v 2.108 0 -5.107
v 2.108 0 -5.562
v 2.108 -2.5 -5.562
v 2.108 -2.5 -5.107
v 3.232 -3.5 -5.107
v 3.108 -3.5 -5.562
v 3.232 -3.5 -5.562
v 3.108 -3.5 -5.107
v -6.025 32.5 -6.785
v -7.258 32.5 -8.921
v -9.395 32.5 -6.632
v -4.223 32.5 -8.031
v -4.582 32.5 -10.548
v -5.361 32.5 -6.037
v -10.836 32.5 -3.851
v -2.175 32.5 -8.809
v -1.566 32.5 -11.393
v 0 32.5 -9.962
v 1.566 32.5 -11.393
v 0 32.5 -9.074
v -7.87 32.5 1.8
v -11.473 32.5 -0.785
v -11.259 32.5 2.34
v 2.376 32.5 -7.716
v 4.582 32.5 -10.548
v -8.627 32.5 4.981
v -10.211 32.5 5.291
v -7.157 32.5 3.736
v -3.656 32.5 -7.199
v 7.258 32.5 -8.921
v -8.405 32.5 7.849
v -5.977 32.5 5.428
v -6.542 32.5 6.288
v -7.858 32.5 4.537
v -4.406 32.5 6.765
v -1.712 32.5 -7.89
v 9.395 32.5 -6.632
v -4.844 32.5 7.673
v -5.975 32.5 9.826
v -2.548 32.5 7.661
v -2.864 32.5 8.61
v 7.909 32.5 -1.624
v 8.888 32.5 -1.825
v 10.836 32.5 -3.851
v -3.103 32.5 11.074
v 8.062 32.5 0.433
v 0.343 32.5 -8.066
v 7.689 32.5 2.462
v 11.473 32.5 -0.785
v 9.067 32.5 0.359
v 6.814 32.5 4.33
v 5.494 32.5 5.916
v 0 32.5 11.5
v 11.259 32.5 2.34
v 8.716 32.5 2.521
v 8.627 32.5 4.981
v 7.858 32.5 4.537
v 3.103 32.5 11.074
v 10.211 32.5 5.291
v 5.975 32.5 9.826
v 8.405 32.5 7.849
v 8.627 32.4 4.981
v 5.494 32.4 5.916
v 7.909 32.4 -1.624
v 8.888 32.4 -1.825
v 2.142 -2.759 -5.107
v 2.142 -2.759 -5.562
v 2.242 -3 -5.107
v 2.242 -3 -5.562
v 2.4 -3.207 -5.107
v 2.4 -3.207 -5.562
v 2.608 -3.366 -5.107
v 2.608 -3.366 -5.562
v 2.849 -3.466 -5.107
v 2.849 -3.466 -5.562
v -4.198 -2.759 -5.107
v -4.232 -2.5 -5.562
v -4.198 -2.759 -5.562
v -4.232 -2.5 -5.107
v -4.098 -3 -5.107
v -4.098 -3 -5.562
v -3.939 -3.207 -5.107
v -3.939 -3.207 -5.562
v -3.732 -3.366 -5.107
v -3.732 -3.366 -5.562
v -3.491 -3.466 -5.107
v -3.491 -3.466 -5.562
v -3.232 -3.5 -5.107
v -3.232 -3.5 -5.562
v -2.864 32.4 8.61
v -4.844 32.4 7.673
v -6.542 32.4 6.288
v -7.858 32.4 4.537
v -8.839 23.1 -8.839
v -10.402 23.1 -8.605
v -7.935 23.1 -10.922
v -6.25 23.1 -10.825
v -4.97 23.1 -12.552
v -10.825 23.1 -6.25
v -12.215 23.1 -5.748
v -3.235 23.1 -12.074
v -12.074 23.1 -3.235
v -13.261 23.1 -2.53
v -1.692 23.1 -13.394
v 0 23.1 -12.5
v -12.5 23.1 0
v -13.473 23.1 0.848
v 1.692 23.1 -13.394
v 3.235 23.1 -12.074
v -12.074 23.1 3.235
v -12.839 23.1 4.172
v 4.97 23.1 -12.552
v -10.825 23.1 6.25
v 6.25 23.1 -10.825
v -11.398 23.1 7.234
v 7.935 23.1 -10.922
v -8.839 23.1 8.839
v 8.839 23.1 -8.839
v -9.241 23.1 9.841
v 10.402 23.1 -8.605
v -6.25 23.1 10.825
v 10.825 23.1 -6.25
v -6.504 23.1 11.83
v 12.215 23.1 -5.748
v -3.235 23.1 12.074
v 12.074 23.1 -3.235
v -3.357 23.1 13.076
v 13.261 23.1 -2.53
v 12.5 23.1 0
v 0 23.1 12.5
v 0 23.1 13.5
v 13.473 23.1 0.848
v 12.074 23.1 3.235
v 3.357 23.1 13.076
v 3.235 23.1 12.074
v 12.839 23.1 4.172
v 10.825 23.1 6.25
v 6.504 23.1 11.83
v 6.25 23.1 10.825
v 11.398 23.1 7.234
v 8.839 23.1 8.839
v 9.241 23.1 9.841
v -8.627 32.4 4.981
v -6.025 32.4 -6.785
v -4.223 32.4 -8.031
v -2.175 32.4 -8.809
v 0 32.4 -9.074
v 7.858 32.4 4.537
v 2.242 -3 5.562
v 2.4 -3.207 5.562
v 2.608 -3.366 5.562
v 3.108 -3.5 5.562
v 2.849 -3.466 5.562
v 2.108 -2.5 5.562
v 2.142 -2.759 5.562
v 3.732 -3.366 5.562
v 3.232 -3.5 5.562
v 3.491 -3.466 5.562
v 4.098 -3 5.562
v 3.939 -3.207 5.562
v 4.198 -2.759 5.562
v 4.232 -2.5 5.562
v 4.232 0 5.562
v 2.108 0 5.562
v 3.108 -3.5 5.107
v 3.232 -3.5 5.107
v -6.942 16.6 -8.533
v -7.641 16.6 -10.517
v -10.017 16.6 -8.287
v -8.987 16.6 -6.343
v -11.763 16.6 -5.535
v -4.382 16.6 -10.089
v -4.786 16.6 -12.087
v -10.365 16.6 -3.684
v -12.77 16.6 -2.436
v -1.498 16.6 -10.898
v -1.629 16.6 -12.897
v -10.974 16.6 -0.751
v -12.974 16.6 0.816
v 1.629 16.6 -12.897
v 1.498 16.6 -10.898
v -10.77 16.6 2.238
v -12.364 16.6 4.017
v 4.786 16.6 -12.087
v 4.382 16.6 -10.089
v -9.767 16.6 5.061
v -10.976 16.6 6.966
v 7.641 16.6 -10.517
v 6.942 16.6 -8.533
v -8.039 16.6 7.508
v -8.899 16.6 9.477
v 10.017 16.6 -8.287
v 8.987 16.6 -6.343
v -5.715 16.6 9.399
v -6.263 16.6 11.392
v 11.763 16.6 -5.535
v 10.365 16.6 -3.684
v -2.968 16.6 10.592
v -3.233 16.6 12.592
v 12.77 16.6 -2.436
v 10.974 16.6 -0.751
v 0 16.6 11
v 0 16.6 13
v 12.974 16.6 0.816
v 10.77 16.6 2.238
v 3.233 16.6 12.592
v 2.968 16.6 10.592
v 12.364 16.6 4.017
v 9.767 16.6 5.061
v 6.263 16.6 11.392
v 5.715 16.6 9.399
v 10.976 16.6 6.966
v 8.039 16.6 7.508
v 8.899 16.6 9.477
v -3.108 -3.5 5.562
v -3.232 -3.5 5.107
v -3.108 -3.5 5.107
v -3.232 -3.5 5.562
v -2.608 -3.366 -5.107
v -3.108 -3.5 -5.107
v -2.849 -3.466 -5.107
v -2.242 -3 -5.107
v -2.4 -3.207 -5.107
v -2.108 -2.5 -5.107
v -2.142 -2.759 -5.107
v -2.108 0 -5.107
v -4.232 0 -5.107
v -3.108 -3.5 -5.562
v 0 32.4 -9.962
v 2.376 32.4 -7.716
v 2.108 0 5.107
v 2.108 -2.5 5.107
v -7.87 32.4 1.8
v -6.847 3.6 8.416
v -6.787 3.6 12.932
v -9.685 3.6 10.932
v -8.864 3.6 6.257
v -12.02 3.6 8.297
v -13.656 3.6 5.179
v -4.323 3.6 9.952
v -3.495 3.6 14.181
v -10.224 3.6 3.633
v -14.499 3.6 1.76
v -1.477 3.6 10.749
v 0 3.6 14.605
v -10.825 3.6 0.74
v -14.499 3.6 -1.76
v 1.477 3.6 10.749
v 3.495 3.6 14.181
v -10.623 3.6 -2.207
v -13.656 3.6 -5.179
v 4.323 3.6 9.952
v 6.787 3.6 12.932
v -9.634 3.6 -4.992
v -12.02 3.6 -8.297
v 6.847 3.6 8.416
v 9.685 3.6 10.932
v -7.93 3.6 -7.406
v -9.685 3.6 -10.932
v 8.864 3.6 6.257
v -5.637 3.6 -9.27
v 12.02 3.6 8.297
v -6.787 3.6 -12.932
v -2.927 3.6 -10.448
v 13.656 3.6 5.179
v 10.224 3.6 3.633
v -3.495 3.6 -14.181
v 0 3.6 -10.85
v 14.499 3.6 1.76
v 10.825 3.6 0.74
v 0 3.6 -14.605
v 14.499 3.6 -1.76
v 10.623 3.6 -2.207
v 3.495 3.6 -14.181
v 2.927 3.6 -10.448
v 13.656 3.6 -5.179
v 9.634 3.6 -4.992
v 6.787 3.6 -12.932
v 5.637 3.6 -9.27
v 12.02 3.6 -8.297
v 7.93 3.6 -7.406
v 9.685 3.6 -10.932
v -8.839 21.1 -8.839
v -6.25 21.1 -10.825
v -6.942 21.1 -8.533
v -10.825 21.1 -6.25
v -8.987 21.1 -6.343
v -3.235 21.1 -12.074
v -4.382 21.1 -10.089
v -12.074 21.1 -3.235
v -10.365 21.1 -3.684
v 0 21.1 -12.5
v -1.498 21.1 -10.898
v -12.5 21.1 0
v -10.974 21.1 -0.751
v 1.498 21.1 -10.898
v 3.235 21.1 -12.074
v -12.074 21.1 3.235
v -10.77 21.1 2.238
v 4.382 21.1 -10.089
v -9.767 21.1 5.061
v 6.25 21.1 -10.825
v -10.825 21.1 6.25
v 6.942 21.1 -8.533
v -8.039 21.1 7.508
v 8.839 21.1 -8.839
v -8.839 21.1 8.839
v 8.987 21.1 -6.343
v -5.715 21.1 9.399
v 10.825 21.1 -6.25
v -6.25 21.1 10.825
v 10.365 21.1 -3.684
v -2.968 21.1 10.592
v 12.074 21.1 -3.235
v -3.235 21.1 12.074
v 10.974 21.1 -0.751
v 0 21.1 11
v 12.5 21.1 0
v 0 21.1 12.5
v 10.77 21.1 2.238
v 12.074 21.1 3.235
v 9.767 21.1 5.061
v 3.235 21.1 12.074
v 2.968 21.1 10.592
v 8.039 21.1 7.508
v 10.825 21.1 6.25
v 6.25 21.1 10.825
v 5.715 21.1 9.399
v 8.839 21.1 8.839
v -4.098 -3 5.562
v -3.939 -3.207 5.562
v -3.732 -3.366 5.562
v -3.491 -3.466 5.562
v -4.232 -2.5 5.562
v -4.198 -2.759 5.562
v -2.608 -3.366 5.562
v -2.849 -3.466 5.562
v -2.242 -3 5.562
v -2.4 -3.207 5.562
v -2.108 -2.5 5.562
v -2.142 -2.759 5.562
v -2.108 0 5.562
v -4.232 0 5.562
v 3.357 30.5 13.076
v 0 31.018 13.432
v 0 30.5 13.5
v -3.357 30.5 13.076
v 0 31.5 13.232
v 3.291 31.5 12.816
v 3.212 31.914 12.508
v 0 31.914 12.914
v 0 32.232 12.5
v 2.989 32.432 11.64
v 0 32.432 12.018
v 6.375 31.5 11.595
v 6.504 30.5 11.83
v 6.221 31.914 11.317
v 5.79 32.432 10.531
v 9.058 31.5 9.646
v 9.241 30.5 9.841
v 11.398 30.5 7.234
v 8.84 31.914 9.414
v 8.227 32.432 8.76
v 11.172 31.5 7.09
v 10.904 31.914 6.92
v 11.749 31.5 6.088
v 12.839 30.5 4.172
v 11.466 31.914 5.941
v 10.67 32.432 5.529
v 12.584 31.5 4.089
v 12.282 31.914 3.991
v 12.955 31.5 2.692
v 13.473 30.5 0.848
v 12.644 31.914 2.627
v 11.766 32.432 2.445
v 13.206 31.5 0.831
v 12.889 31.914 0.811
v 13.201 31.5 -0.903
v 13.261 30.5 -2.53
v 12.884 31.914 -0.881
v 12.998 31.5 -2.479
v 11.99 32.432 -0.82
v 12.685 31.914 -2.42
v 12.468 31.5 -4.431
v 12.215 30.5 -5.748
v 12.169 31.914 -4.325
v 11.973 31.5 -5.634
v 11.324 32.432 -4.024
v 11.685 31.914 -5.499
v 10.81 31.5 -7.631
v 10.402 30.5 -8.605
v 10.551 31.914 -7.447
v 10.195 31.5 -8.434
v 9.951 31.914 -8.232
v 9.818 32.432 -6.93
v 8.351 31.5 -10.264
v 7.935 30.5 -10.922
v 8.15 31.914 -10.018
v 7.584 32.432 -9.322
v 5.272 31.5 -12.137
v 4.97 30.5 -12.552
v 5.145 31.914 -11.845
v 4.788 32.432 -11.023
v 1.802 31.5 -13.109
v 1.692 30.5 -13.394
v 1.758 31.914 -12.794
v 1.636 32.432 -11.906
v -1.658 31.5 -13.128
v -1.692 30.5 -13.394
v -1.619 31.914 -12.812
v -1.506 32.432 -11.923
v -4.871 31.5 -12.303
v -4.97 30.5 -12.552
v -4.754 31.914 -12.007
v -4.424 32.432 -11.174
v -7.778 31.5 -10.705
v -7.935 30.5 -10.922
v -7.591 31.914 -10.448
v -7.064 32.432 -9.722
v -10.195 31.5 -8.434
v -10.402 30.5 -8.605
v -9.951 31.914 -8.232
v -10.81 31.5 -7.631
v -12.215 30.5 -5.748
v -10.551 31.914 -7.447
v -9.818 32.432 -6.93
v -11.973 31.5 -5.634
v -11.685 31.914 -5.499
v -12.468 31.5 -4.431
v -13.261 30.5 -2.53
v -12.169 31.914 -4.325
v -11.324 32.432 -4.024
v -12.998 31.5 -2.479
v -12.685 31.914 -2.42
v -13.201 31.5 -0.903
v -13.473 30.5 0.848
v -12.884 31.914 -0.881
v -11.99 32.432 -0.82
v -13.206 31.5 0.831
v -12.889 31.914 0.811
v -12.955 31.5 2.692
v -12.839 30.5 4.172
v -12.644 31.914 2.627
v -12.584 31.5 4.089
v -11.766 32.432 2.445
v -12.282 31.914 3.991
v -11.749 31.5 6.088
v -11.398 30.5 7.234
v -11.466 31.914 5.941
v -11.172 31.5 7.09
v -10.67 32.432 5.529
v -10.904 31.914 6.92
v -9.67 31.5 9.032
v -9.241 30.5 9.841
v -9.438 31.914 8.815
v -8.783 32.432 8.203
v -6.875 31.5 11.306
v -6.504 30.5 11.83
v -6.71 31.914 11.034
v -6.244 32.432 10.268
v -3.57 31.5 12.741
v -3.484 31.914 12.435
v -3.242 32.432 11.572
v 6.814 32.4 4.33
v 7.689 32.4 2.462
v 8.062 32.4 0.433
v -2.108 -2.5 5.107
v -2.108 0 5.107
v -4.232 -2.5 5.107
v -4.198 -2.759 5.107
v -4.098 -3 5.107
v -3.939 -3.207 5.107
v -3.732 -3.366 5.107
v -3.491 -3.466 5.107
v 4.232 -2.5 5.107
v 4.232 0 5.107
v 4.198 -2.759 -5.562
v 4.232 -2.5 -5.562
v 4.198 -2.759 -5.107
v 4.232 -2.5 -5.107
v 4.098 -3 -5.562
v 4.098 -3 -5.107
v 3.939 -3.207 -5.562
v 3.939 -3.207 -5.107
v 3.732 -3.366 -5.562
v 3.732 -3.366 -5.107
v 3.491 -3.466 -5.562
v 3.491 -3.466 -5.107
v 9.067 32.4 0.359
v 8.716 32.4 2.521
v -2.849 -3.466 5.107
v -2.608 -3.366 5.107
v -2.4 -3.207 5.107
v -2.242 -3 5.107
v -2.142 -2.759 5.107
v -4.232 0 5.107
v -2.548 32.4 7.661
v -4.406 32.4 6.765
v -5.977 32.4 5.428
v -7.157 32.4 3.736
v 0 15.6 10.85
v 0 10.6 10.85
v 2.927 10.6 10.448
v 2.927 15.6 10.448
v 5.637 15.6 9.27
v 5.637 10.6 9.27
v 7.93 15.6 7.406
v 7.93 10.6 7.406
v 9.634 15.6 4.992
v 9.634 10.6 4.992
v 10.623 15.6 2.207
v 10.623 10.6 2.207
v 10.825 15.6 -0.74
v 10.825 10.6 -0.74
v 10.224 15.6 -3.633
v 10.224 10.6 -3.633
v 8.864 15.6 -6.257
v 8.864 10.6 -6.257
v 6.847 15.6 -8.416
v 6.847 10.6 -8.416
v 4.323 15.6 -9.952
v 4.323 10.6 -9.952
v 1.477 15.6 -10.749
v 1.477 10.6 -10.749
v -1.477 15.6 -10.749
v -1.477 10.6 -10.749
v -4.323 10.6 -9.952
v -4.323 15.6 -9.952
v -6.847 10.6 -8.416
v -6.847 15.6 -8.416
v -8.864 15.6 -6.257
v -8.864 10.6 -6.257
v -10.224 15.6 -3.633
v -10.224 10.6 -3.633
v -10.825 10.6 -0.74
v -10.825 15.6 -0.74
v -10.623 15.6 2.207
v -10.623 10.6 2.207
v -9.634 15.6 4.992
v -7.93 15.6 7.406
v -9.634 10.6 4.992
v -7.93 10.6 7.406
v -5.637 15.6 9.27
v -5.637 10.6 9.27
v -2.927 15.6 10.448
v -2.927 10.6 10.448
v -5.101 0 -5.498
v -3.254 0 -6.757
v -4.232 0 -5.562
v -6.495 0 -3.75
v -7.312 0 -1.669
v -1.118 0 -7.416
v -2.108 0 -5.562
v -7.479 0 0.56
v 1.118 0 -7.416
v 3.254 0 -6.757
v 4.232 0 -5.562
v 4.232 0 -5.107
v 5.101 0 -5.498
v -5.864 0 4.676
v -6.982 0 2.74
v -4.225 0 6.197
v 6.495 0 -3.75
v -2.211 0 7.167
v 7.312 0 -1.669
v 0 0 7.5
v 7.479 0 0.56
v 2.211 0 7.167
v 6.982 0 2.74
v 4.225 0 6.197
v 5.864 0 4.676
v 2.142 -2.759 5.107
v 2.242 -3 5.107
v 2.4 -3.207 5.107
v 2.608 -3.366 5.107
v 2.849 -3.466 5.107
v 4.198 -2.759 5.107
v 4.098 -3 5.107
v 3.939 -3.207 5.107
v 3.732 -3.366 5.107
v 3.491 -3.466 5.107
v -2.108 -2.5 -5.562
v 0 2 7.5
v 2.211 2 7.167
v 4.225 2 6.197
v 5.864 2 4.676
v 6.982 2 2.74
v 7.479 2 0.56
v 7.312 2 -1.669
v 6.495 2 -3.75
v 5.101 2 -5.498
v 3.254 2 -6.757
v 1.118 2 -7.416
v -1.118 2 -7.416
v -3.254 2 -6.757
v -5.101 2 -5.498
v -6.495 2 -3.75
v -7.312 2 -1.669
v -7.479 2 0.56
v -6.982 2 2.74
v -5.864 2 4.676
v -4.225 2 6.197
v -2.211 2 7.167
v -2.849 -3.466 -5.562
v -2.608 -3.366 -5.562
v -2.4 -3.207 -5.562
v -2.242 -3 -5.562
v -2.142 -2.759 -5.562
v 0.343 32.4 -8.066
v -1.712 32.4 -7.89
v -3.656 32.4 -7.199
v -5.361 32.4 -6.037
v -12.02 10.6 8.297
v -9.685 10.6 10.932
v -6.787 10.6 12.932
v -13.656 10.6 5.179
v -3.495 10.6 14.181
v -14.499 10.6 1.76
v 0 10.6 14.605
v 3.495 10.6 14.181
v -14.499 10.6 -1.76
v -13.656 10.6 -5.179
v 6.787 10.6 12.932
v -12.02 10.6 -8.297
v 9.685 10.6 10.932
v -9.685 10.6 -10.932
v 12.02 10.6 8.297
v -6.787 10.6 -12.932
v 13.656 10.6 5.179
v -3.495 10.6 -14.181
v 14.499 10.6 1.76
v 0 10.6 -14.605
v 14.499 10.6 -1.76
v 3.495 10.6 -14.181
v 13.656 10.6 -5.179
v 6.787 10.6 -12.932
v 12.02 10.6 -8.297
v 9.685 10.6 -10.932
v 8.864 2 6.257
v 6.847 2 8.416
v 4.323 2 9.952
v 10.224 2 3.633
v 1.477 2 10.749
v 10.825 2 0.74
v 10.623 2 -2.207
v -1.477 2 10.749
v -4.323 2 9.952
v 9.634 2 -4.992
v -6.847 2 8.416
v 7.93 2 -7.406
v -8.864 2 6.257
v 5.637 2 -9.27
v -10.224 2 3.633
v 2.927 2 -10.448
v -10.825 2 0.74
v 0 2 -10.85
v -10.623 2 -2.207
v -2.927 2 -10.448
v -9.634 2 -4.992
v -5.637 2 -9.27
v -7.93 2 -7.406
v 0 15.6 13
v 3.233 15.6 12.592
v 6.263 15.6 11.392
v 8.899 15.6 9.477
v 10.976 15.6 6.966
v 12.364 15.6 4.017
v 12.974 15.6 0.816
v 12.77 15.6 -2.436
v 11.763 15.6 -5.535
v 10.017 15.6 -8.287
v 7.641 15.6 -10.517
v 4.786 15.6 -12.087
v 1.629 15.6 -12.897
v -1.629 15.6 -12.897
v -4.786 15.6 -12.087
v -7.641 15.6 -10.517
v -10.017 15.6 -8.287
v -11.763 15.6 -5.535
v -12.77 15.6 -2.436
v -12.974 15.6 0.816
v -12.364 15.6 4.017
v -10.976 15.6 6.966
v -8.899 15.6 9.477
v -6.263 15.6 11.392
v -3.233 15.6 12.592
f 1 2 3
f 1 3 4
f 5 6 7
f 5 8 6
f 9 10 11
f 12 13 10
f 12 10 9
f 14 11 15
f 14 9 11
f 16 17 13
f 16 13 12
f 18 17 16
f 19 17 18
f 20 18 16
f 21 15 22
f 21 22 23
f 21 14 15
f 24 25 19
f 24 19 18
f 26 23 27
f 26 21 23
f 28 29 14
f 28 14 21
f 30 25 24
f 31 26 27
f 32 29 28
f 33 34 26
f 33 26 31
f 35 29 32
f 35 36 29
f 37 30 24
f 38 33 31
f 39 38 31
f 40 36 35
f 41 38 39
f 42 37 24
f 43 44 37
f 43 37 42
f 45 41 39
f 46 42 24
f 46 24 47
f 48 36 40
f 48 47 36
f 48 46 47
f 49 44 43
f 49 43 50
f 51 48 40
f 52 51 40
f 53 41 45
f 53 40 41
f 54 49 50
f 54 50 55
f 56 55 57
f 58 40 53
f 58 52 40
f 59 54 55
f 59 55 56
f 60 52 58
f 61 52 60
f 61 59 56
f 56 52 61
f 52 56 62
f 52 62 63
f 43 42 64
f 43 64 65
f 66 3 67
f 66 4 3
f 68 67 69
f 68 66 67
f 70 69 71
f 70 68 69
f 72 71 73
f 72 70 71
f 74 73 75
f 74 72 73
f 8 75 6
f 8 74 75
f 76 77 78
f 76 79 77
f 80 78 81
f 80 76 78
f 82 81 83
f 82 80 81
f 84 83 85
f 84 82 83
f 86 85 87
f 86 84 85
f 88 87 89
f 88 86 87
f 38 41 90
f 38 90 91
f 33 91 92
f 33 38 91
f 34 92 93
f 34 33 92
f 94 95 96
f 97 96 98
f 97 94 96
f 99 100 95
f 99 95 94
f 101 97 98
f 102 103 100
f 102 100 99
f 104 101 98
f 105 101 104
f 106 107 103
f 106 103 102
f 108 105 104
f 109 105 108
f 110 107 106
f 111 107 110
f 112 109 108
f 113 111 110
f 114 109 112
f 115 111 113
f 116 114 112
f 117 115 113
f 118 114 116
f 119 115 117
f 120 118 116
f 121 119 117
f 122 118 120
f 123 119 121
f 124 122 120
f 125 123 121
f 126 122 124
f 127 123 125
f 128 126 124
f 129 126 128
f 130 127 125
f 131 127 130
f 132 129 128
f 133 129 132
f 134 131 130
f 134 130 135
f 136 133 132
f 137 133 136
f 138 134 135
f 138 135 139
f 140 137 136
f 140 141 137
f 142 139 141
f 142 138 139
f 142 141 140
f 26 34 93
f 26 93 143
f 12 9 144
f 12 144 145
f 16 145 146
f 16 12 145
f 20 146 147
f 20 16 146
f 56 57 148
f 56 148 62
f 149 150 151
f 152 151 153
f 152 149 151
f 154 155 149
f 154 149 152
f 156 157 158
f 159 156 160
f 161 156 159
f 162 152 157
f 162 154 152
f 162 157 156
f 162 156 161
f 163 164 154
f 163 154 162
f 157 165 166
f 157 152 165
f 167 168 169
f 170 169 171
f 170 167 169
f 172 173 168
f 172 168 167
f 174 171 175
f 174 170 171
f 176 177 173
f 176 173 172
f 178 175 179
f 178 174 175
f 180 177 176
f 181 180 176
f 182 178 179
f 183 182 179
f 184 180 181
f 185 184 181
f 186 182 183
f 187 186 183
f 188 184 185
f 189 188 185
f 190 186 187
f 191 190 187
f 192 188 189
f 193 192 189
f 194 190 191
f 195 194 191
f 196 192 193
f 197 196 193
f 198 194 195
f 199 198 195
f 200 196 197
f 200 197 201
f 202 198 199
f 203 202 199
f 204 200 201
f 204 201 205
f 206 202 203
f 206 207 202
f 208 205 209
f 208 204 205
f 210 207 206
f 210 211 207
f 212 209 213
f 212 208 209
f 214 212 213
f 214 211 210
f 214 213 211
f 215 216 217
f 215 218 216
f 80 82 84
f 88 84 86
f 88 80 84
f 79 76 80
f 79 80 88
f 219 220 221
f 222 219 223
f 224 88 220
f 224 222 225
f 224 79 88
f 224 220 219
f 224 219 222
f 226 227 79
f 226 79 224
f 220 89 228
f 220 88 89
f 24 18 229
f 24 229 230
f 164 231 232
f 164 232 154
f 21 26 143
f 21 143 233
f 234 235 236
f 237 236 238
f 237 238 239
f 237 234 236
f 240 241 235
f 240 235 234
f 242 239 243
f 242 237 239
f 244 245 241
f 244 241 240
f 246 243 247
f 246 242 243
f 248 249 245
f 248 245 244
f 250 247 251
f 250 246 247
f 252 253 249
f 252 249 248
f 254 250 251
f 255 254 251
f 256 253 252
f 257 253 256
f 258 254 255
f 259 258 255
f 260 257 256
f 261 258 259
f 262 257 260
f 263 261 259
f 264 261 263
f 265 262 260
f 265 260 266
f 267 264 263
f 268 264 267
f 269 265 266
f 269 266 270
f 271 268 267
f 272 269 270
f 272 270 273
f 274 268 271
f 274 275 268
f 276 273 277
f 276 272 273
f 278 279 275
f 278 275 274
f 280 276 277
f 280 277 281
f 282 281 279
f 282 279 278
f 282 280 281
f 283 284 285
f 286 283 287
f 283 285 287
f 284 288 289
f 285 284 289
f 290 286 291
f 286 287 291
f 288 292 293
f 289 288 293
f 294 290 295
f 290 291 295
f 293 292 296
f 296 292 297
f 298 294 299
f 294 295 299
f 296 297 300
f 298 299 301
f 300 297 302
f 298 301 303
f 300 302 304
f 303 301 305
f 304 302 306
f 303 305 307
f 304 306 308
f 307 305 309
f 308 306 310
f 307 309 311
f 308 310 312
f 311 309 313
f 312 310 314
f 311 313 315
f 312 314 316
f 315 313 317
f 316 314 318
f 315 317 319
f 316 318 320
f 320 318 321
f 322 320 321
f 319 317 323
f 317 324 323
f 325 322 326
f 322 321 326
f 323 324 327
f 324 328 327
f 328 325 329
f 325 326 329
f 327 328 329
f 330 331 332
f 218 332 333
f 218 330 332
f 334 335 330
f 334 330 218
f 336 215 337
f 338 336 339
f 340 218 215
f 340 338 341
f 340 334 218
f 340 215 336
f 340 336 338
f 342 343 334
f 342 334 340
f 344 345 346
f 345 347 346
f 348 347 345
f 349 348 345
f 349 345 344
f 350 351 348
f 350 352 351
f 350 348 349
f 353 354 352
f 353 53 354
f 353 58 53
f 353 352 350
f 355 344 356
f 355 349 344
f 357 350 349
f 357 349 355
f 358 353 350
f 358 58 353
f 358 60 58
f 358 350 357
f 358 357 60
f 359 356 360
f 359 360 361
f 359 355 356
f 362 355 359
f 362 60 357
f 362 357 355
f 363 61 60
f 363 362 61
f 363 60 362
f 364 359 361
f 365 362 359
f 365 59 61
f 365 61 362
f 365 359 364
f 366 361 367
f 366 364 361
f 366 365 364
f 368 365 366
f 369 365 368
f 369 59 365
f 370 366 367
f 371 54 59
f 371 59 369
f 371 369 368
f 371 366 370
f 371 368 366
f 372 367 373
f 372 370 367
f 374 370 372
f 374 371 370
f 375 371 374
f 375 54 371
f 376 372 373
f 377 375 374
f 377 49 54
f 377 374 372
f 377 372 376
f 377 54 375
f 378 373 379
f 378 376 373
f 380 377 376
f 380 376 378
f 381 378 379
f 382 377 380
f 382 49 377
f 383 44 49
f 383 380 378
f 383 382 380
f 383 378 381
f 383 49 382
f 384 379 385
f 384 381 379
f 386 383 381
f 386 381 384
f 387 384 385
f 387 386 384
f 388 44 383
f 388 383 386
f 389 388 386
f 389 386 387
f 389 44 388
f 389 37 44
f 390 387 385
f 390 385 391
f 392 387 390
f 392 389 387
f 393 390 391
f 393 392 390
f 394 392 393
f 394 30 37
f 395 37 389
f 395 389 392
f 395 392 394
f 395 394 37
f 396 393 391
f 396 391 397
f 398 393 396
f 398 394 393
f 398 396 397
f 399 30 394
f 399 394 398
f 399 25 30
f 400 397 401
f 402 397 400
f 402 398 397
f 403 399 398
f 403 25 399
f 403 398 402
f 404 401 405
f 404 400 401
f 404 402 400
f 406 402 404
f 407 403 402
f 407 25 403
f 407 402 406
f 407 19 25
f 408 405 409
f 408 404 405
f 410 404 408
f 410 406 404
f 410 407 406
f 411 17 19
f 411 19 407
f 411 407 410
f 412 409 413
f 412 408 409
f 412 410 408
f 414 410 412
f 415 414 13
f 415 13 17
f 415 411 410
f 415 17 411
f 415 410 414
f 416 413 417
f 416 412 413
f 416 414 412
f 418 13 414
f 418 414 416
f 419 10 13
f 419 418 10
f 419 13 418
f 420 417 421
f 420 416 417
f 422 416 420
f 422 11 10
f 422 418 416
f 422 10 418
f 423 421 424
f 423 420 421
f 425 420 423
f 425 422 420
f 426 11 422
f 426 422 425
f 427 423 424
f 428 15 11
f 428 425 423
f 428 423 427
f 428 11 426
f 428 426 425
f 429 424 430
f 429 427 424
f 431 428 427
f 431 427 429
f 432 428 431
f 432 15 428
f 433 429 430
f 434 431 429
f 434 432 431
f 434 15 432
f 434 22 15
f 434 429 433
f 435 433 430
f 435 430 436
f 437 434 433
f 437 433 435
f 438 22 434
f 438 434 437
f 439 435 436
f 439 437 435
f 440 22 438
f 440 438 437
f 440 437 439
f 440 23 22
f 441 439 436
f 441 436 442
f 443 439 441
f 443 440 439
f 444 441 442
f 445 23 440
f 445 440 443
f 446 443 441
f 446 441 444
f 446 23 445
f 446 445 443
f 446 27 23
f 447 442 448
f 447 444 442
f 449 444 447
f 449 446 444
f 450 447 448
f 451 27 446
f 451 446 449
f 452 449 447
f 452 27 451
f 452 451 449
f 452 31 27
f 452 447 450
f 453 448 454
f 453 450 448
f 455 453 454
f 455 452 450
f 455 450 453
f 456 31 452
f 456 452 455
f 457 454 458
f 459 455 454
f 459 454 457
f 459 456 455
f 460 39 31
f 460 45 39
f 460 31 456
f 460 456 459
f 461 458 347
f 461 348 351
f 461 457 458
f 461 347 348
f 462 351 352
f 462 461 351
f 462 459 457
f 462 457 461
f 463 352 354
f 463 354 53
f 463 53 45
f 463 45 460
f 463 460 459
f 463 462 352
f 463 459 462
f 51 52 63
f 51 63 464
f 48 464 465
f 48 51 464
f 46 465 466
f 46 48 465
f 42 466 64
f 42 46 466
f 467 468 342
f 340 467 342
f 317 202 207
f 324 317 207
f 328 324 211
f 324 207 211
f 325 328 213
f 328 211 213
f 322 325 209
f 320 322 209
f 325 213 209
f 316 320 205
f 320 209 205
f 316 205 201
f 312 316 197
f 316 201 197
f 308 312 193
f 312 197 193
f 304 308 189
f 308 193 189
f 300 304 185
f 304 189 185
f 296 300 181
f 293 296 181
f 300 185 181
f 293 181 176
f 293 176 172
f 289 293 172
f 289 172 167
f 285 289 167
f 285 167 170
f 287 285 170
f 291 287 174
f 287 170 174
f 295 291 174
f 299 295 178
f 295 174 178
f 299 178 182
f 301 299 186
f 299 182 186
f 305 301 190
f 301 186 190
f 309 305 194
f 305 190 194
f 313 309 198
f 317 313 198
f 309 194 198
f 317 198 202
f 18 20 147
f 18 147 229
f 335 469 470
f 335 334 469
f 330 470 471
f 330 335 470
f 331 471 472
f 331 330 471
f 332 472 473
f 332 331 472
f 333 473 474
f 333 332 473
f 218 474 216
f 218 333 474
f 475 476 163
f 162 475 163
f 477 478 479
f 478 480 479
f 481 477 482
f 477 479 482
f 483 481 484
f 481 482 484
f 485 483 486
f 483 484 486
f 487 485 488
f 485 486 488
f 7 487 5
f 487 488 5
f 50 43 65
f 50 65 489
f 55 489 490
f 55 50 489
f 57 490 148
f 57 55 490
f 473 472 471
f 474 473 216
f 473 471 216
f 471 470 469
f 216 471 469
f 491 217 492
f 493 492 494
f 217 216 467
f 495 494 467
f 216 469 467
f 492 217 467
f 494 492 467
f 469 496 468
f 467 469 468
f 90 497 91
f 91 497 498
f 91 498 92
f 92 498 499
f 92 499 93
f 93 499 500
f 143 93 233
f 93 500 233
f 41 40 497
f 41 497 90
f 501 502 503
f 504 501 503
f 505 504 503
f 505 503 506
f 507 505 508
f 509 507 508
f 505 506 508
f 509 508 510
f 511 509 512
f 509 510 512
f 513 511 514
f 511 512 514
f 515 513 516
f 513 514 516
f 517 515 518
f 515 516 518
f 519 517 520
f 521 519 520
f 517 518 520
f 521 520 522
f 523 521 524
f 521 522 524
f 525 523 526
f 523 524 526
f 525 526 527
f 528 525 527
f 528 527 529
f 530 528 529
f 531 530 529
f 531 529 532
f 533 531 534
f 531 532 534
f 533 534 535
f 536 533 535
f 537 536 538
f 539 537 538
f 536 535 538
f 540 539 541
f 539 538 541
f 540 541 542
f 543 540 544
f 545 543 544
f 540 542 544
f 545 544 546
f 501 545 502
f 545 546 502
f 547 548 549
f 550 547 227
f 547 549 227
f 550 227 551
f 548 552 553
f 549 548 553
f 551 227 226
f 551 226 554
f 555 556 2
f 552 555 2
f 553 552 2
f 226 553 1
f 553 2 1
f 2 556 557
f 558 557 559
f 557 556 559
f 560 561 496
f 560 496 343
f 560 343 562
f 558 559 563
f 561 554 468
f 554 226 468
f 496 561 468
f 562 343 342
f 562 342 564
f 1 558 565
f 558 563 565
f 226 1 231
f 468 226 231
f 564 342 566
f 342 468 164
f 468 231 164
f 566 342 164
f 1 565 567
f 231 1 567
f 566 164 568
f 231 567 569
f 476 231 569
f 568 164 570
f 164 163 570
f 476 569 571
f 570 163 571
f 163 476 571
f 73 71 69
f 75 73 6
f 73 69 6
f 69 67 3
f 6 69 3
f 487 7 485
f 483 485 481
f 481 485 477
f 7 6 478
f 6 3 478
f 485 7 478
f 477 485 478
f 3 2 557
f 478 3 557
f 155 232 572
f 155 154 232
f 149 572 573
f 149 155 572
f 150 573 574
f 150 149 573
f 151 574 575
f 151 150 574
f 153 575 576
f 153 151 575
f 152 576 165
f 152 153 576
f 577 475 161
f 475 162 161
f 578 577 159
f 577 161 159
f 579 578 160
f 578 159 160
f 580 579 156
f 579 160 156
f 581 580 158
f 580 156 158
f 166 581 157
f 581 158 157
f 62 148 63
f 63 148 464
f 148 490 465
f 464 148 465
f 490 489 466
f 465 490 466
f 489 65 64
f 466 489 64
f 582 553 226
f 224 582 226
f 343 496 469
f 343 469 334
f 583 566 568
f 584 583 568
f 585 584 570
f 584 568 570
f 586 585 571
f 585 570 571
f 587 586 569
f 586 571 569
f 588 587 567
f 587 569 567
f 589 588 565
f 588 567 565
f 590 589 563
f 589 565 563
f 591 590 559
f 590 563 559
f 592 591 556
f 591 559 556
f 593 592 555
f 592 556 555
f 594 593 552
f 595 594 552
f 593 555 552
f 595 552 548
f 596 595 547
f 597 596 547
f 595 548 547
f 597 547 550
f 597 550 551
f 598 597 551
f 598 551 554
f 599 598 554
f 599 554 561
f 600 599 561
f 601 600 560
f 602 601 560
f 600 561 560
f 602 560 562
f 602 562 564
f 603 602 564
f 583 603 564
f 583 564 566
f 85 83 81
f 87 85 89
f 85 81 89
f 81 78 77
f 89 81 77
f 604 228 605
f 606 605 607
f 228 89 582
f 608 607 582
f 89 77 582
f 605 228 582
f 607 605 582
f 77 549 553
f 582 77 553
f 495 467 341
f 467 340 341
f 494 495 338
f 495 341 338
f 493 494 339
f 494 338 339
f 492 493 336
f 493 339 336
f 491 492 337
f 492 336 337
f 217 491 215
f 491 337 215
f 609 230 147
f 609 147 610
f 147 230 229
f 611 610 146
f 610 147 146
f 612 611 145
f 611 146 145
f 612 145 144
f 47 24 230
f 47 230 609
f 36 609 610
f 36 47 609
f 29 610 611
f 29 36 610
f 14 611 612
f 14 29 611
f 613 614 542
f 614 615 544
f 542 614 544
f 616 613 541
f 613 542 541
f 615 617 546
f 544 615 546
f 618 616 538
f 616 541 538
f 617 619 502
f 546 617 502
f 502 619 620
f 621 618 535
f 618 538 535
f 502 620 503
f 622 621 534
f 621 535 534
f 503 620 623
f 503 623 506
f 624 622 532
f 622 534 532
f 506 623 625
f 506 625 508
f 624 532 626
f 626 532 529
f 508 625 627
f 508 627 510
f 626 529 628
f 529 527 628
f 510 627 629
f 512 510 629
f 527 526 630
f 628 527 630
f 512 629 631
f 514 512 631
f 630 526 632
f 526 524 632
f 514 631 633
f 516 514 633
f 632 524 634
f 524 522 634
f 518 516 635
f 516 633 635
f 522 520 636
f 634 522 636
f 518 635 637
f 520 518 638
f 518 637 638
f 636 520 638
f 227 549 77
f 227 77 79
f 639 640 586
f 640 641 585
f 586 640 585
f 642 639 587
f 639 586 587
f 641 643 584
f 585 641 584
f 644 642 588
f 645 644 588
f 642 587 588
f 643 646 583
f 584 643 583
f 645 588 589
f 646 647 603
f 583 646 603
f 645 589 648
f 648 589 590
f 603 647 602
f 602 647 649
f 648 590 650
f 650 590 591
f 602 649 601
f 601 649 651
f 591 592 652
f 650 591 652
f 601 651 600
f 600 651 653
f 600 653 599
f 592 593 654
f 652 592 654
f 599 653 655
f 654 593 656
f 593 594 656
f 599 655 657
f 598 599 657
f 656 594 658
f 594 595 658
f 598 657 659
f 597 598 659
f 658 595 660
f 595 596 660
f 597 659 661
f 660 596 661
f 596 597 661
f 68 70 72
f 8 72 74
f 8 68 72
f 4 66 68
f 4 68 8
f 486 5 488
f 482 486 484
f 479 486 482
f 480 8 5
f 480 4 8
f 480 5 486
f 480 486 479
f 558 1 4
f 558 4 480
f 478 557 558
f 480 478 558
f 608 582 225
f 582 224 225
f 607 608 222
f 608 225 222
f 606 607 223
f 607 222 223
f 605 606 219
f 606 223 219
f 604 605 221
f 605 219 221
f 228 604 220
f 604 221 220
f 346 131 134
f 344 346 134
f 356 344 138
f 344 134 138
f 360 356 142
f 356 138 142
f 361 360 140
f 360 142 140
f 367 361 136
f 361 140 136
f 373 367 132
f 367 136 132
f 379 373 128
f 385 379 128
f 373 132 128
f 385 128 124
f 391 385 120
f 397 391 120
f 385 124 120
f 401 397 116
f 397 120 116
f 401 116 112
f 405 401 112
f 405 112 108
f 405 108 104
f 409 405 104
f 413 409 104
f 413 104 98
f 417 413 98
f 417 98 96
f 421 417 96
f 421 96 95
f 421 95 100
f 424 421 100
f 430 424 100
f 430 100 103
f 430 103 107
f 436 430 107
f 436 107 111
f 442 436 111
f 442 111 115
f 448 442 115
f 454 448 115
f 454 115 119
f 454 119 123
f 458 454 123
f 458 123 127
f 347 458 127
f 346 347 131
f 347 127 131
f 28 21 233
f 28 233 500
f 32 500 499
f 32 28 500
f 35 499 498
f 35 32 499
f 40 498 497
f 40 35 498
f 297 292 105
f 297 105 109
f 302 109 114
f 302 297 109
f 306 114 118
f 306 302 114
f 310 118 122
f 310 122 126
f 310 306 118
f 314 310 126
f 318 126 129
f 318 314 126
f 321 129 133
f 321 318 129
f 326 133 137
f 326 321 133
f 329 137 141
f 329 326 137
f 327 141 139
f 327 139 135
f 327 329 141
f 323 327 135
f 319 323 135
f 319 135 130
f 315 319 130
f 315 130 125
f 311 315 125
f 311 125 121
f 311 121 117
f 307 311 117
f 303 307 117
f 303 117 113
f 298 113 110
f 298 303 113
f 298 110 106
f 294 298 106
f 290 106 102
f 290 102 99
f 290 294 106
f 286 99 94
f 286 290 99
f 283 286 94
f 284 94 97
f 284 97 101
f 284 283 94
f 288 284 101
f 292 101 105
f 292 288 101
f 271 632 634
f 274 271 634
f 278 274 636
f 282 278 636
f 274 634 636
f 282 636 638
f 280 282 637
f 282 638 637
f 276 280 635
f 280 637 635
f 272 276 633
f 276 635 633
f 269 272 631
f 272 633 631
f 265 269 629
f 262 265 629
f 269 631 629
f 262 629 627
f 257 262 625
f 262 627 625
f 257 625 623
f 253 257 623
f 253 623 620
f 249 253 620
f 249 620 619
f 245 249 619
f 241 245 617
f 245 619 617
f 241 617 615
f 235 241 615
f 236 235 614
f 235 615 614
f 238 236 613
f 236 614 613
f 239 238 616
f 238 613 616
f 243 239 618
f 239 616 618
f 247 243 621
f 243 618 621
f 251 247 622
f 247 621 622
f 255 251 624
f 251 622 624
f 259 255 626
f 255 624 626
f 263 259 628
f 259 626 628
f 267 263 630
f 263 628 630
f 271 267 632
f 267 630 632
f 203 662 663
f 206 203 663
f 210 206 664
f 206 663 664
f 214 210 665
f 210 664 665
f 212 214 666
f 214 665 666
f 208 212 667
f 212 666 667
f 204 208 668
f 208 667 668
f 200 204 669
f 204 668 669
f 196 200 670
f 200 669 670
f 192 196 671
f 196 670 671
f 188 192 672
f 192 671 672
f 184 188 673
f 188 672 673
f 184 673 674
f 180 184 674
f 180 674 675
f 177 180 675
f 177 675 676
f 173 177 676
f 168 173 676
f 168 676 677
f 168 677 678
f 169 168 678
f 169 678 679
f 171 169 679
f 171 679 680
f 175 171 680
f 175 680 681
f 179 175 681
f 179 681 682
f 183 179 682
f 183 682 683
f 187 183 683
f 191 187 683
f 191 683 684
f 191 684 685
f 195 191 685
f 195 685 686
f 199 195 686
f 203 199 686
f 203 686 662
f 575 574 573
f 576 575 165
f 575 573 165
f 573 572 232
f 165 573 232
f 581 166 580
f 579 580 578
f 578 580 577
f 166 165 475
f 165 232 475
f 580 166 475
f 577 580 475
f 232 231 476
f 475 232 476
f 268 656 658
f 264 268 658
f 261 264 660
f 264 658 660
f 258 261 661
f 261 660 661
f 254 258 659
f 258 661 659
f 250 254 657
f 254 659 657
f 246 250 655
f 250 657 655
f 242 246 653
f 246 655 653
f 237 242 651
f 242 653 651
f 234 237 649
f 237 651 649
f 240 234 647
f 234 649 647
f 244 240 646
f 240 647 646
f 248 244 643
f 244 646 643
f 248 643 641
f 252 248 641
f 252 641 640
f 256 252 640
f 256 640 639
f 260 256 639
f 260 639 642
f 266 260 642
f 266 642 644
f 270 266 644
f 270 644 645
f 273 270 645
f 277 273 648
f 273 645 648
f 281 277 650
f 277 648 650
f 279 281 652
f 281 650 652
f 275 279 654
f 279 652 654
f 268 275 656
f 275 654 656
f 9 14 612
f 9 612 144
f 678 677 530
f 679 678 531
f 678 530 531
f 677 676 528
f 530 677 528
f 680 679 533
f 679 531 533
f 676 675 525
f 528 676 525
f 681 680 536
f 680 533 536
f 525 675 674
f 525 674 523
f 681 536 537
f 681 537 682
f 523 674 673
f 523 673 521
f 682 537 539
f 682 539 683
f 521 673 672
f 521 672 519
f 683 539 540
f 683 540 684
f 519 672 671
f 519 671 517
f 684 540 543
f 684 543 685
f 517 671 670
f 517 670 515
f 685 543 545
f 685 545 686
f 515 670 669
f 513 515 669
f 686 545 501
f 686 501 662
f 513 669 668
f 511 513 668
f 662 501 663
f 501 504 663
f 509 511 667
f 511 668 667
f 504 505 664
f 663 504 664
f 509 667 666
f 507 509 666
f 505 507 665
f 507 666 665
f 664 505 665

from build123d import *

# Parameters (mm, degrees)
SKETCH_1_R          = 7.5
EXTRUDE_1_DEPTH     = 2
SKETCH_2_W          = 2.124250946
SKETCH_2_H          = 0.455196631
EXTRUDE_2_DEPTH     = 3.5
FILLET_1_R          = 1
SKETCH_4_R          = 10.85
EXTRUDE_3_DEPTH     = 8.6
SKETCH_5_R          = 13
EXTRUDE_4_DEPTH     = 6
SKETCH_7_R          = 11
EXTRUDE_6_DEPTH     = 4.5
SKETCH_8_R          = 13.5
EXTRUDE_7_DEPTH     = 11.4
FILLET_5_R          = 2
SKETCH_9_OUTSIDE_W  = 39.496
SKETCH_9_OUTSIDE_H  = 39.496
SKETCH_9_OUTSIDE_R  = 12.5
CUT_EXTRUDE_1_DEPTH = 2
CUT_EXTRUDE_2_DEPTH = 0.1
SKETCH_11_R         = 14.605
EXTRUDE_8_DEPTH     = 7
SKETCH_12_R         = 13
SKETCH_12_R_2       = 10.85
CUT_EXTRUDE_3_DEPTH = 5


with BuildPart() as part:
    # 草图1 → 凸台-拉伸1 (new body)
    with BuildSketch(Plane(origin=(0, 0, 0), x_dir=(1, 0, 0), z_dir=(0, 1, 0))):
        with Locations(Location((0, 0, 0), (0, 0, 270))):
            Circle(SKETCH_1_R)
    extrude(amount=EXTRUDE_1_DEPTH)

    # 草图2 → 凸台-拉伸2 (add)
    with BuildSketch(Plane.XZ):
        with Locations((-3.169695017, 5.334335524)):
            Rectangle(SKETCH_2_W, SKETCH_2_H)
        with Locations((3.169695017, 5.334335524)):
            Rectangle(SKETCH_2_W, SKETCH_2_H)
        with Locations((3.169695017, -5.334335524)):
            Rectangle(SKETCH_2_W, SKETCH_2_H)
        with Locations((-3.169695017, -5.334335524)):
            Rectangle(SKETCH_2_W, SKETCH_2_H)
    extrude(amount=EXTRUDE_2_DEPTH)

    # 圆角1
    fillet_1_edges = [part.edges().sort_by_distance(p)[0] for p in [
        (4.23182049, -3.5, 5.334335524),
        (2.107569544, -3.5, 5.334335524),
        (4.23182049, -3.5, -5.334335524),
        (2.107569544, -3.5, -5.334335524),
        (-4.23182049, -3.5, -5.334335524),
        (-2.107569544, -3.5, -5.334335524),
        (-2.107569544, -3.5, 5.334335524),
        (-4.23182049, -3.5, 5.334335524),
    ]]
    fillet(fillet_1_edges, radius=FILLET_1_R)

    # 草图4 → 凸台-拉伸3 (add)
    with BuildSketch(Plane(origin=(0, 2, 0), x_dir=(1, 0, 0), z_dir=(0, 1, 0))):
        with Locations(Location((0, 0, 0), (0, 0, 90))):
            Circle(SKETCH_4_R)
    extrude(amount=EXTRUDE_3_DEPTH)

    # 草图5 → 凸台-拉伸4 (add)
    with BuildSketch(Plane(origin=(0, 10.6, 0), x_dir=(1, 0, 0), z_dir=(0, 1, 0))):
        with Locations(Location((0, 0, 0), (0, 0, 270))):
            Circle(SKETCH_5_R)
    extrude(amount=EXTRUDE_4_DEPTH)

    # 草图7 → 凸台-拉伸6 (add)
    with BuildSketch(Plane(origin=(0, 16.6, 0), x_dir=(1, 0, 0), z_dir=(0, 1, 0))):
        with Locations(Location((0, 0, 0), (0, 0, 270))):
            Circle(SKETCH_7_R)
    extrude(amount=EXTRUDE_6_DEPTH)

    # 草图8 → 凸台-拉伸7 (add)
    with BuildSketch(Plane(origin=(0, 21.1, 0), x_dir=(1, 0, 0), z_dir=(0, 1, 0))):
        with Locations(Location((0, 0, 0), (0, 0, 270))):
            Circle(SKETCH_8_R)
    extrude(amount=EXTRUDE_7_DEPTH)

    # 圆角5
    fillet_5_edges = [part.edges().sort_by_distance(p)[0] for p in [
        (0, 32.5, -13.5),
    ]]
    fillet(fillet_5_edges, radius=FILLET_5_R)

    # 草图9 outside → 切除-拉伸1 (cut)
    with BuildSketch(Plane.XZ.offset(-21.1)):
        Rectangle(SKETCH_9_OUTSIDE_W, SKETCH_9_OUTSIDE_H)
        with Locations(Location((0, 0, 0), (0, 0, 270))):
            Circle(SKETCH_9_OUTSIDE_R, mode=Mode.SUBTRACT)
    extrude(amount=-CUT_EXTRUDE_1_DEPTH, mode=Mode.SUBTRACT)

    # 草图10 → 切除-拉伸2 (cut)
    with BuildSketch(Plane(origin=(0, 32.5, 0), x_dir=(1, 0, 0), z_dir=(0, 1, 0))):
        with BuildLine():
            Line((0, 9.073721602), (0, 9.961907626))
            Line((0, 9.961907626), (2.376046015, 7.716176893))
            ThreePointArc((2.376046015, 7.716176893), (-1.712152333, 7.890089663), (-5.36056205, 6.037330123))
            Line((-5.36056205, 6.037330123), (-6.024513857, 6.785105489))
            ThreePointArc((-6.024513857, 6.785105489), (-3.222286879, 8.48229279), (0, 9.073721602))
        make_face()
        with BuildLine():
            Line((8.627265074, -4.980953813), (5.494382202, -5.915804656))
            ThreePointArc((5.494382202, -5.915804656), (7.689094253, -2.462277416), (7.908762283, 1.623717852))
            Line((7.908762283, 1.623717852), (8.888330649, 1.824829301))
            ThreePointArc((8.888330649, 1.824829301), (8.957024478, -1.450564099), (7.858073414, -4.536860801))
            Line((7.858073414, -4.536860801), (8.627265074, -4.980953813))
        make_face()
        with BuildLine():
            Line((-8.627265074, -4.980953813), (-7.870428217, -1.800372237))
            ThreePointArc((-7.870428217, -1.800372237), (-5.97694192, -5.427812247), (-2.548200233, -7.661047975))
            Line((-2.548200233, -7.661047975), (-2.863816792, -8.60993479))
            ThreePointArc((-2.863816792, -8.60993479), (-5.734737599, -7.031728691), (-7.858073414, -4.536860801))
            Line((-7.858073414, -4.536860801), (-8.627265074, -4.980953813))
        make_face()
    extrude(amount=-CUT_EXTRUDE_2_DEPTH, mode=Mode.SUBTRACT)

    # 草图11 → 凸台-拉伸8 (add)
    with BuildSketch(Plane.XZ.offset(-10.6)):
        with Locations(Location((0, 0, 0), (0, 0, 270))):
            Circle(SKETCH_11_R)
    extrude(amount=EXTRUDE_8_DEPTH)

    # 草图12 → 切除-拉伸3 (cut)
    with BuildSketch(Plane(origin=(0, 10.6, 0), x_dir=(1, 0, 0), z_dir=(0, 1, 0))):
        with Locations(Location((0, 0, 0), (0, 0, 270))):
            Circle(SKETCH_12_R)
        with Locations(Location((0, 0, 0), (0, 0, 270))):
            Circle(SKETCH_12_R_2, mode=Mode.SUBTRACT)
    extrude(amount=CUT_EXTRUDE_3_DEPTH, mode=Mode.SUBTRACT)


solid = part.part
